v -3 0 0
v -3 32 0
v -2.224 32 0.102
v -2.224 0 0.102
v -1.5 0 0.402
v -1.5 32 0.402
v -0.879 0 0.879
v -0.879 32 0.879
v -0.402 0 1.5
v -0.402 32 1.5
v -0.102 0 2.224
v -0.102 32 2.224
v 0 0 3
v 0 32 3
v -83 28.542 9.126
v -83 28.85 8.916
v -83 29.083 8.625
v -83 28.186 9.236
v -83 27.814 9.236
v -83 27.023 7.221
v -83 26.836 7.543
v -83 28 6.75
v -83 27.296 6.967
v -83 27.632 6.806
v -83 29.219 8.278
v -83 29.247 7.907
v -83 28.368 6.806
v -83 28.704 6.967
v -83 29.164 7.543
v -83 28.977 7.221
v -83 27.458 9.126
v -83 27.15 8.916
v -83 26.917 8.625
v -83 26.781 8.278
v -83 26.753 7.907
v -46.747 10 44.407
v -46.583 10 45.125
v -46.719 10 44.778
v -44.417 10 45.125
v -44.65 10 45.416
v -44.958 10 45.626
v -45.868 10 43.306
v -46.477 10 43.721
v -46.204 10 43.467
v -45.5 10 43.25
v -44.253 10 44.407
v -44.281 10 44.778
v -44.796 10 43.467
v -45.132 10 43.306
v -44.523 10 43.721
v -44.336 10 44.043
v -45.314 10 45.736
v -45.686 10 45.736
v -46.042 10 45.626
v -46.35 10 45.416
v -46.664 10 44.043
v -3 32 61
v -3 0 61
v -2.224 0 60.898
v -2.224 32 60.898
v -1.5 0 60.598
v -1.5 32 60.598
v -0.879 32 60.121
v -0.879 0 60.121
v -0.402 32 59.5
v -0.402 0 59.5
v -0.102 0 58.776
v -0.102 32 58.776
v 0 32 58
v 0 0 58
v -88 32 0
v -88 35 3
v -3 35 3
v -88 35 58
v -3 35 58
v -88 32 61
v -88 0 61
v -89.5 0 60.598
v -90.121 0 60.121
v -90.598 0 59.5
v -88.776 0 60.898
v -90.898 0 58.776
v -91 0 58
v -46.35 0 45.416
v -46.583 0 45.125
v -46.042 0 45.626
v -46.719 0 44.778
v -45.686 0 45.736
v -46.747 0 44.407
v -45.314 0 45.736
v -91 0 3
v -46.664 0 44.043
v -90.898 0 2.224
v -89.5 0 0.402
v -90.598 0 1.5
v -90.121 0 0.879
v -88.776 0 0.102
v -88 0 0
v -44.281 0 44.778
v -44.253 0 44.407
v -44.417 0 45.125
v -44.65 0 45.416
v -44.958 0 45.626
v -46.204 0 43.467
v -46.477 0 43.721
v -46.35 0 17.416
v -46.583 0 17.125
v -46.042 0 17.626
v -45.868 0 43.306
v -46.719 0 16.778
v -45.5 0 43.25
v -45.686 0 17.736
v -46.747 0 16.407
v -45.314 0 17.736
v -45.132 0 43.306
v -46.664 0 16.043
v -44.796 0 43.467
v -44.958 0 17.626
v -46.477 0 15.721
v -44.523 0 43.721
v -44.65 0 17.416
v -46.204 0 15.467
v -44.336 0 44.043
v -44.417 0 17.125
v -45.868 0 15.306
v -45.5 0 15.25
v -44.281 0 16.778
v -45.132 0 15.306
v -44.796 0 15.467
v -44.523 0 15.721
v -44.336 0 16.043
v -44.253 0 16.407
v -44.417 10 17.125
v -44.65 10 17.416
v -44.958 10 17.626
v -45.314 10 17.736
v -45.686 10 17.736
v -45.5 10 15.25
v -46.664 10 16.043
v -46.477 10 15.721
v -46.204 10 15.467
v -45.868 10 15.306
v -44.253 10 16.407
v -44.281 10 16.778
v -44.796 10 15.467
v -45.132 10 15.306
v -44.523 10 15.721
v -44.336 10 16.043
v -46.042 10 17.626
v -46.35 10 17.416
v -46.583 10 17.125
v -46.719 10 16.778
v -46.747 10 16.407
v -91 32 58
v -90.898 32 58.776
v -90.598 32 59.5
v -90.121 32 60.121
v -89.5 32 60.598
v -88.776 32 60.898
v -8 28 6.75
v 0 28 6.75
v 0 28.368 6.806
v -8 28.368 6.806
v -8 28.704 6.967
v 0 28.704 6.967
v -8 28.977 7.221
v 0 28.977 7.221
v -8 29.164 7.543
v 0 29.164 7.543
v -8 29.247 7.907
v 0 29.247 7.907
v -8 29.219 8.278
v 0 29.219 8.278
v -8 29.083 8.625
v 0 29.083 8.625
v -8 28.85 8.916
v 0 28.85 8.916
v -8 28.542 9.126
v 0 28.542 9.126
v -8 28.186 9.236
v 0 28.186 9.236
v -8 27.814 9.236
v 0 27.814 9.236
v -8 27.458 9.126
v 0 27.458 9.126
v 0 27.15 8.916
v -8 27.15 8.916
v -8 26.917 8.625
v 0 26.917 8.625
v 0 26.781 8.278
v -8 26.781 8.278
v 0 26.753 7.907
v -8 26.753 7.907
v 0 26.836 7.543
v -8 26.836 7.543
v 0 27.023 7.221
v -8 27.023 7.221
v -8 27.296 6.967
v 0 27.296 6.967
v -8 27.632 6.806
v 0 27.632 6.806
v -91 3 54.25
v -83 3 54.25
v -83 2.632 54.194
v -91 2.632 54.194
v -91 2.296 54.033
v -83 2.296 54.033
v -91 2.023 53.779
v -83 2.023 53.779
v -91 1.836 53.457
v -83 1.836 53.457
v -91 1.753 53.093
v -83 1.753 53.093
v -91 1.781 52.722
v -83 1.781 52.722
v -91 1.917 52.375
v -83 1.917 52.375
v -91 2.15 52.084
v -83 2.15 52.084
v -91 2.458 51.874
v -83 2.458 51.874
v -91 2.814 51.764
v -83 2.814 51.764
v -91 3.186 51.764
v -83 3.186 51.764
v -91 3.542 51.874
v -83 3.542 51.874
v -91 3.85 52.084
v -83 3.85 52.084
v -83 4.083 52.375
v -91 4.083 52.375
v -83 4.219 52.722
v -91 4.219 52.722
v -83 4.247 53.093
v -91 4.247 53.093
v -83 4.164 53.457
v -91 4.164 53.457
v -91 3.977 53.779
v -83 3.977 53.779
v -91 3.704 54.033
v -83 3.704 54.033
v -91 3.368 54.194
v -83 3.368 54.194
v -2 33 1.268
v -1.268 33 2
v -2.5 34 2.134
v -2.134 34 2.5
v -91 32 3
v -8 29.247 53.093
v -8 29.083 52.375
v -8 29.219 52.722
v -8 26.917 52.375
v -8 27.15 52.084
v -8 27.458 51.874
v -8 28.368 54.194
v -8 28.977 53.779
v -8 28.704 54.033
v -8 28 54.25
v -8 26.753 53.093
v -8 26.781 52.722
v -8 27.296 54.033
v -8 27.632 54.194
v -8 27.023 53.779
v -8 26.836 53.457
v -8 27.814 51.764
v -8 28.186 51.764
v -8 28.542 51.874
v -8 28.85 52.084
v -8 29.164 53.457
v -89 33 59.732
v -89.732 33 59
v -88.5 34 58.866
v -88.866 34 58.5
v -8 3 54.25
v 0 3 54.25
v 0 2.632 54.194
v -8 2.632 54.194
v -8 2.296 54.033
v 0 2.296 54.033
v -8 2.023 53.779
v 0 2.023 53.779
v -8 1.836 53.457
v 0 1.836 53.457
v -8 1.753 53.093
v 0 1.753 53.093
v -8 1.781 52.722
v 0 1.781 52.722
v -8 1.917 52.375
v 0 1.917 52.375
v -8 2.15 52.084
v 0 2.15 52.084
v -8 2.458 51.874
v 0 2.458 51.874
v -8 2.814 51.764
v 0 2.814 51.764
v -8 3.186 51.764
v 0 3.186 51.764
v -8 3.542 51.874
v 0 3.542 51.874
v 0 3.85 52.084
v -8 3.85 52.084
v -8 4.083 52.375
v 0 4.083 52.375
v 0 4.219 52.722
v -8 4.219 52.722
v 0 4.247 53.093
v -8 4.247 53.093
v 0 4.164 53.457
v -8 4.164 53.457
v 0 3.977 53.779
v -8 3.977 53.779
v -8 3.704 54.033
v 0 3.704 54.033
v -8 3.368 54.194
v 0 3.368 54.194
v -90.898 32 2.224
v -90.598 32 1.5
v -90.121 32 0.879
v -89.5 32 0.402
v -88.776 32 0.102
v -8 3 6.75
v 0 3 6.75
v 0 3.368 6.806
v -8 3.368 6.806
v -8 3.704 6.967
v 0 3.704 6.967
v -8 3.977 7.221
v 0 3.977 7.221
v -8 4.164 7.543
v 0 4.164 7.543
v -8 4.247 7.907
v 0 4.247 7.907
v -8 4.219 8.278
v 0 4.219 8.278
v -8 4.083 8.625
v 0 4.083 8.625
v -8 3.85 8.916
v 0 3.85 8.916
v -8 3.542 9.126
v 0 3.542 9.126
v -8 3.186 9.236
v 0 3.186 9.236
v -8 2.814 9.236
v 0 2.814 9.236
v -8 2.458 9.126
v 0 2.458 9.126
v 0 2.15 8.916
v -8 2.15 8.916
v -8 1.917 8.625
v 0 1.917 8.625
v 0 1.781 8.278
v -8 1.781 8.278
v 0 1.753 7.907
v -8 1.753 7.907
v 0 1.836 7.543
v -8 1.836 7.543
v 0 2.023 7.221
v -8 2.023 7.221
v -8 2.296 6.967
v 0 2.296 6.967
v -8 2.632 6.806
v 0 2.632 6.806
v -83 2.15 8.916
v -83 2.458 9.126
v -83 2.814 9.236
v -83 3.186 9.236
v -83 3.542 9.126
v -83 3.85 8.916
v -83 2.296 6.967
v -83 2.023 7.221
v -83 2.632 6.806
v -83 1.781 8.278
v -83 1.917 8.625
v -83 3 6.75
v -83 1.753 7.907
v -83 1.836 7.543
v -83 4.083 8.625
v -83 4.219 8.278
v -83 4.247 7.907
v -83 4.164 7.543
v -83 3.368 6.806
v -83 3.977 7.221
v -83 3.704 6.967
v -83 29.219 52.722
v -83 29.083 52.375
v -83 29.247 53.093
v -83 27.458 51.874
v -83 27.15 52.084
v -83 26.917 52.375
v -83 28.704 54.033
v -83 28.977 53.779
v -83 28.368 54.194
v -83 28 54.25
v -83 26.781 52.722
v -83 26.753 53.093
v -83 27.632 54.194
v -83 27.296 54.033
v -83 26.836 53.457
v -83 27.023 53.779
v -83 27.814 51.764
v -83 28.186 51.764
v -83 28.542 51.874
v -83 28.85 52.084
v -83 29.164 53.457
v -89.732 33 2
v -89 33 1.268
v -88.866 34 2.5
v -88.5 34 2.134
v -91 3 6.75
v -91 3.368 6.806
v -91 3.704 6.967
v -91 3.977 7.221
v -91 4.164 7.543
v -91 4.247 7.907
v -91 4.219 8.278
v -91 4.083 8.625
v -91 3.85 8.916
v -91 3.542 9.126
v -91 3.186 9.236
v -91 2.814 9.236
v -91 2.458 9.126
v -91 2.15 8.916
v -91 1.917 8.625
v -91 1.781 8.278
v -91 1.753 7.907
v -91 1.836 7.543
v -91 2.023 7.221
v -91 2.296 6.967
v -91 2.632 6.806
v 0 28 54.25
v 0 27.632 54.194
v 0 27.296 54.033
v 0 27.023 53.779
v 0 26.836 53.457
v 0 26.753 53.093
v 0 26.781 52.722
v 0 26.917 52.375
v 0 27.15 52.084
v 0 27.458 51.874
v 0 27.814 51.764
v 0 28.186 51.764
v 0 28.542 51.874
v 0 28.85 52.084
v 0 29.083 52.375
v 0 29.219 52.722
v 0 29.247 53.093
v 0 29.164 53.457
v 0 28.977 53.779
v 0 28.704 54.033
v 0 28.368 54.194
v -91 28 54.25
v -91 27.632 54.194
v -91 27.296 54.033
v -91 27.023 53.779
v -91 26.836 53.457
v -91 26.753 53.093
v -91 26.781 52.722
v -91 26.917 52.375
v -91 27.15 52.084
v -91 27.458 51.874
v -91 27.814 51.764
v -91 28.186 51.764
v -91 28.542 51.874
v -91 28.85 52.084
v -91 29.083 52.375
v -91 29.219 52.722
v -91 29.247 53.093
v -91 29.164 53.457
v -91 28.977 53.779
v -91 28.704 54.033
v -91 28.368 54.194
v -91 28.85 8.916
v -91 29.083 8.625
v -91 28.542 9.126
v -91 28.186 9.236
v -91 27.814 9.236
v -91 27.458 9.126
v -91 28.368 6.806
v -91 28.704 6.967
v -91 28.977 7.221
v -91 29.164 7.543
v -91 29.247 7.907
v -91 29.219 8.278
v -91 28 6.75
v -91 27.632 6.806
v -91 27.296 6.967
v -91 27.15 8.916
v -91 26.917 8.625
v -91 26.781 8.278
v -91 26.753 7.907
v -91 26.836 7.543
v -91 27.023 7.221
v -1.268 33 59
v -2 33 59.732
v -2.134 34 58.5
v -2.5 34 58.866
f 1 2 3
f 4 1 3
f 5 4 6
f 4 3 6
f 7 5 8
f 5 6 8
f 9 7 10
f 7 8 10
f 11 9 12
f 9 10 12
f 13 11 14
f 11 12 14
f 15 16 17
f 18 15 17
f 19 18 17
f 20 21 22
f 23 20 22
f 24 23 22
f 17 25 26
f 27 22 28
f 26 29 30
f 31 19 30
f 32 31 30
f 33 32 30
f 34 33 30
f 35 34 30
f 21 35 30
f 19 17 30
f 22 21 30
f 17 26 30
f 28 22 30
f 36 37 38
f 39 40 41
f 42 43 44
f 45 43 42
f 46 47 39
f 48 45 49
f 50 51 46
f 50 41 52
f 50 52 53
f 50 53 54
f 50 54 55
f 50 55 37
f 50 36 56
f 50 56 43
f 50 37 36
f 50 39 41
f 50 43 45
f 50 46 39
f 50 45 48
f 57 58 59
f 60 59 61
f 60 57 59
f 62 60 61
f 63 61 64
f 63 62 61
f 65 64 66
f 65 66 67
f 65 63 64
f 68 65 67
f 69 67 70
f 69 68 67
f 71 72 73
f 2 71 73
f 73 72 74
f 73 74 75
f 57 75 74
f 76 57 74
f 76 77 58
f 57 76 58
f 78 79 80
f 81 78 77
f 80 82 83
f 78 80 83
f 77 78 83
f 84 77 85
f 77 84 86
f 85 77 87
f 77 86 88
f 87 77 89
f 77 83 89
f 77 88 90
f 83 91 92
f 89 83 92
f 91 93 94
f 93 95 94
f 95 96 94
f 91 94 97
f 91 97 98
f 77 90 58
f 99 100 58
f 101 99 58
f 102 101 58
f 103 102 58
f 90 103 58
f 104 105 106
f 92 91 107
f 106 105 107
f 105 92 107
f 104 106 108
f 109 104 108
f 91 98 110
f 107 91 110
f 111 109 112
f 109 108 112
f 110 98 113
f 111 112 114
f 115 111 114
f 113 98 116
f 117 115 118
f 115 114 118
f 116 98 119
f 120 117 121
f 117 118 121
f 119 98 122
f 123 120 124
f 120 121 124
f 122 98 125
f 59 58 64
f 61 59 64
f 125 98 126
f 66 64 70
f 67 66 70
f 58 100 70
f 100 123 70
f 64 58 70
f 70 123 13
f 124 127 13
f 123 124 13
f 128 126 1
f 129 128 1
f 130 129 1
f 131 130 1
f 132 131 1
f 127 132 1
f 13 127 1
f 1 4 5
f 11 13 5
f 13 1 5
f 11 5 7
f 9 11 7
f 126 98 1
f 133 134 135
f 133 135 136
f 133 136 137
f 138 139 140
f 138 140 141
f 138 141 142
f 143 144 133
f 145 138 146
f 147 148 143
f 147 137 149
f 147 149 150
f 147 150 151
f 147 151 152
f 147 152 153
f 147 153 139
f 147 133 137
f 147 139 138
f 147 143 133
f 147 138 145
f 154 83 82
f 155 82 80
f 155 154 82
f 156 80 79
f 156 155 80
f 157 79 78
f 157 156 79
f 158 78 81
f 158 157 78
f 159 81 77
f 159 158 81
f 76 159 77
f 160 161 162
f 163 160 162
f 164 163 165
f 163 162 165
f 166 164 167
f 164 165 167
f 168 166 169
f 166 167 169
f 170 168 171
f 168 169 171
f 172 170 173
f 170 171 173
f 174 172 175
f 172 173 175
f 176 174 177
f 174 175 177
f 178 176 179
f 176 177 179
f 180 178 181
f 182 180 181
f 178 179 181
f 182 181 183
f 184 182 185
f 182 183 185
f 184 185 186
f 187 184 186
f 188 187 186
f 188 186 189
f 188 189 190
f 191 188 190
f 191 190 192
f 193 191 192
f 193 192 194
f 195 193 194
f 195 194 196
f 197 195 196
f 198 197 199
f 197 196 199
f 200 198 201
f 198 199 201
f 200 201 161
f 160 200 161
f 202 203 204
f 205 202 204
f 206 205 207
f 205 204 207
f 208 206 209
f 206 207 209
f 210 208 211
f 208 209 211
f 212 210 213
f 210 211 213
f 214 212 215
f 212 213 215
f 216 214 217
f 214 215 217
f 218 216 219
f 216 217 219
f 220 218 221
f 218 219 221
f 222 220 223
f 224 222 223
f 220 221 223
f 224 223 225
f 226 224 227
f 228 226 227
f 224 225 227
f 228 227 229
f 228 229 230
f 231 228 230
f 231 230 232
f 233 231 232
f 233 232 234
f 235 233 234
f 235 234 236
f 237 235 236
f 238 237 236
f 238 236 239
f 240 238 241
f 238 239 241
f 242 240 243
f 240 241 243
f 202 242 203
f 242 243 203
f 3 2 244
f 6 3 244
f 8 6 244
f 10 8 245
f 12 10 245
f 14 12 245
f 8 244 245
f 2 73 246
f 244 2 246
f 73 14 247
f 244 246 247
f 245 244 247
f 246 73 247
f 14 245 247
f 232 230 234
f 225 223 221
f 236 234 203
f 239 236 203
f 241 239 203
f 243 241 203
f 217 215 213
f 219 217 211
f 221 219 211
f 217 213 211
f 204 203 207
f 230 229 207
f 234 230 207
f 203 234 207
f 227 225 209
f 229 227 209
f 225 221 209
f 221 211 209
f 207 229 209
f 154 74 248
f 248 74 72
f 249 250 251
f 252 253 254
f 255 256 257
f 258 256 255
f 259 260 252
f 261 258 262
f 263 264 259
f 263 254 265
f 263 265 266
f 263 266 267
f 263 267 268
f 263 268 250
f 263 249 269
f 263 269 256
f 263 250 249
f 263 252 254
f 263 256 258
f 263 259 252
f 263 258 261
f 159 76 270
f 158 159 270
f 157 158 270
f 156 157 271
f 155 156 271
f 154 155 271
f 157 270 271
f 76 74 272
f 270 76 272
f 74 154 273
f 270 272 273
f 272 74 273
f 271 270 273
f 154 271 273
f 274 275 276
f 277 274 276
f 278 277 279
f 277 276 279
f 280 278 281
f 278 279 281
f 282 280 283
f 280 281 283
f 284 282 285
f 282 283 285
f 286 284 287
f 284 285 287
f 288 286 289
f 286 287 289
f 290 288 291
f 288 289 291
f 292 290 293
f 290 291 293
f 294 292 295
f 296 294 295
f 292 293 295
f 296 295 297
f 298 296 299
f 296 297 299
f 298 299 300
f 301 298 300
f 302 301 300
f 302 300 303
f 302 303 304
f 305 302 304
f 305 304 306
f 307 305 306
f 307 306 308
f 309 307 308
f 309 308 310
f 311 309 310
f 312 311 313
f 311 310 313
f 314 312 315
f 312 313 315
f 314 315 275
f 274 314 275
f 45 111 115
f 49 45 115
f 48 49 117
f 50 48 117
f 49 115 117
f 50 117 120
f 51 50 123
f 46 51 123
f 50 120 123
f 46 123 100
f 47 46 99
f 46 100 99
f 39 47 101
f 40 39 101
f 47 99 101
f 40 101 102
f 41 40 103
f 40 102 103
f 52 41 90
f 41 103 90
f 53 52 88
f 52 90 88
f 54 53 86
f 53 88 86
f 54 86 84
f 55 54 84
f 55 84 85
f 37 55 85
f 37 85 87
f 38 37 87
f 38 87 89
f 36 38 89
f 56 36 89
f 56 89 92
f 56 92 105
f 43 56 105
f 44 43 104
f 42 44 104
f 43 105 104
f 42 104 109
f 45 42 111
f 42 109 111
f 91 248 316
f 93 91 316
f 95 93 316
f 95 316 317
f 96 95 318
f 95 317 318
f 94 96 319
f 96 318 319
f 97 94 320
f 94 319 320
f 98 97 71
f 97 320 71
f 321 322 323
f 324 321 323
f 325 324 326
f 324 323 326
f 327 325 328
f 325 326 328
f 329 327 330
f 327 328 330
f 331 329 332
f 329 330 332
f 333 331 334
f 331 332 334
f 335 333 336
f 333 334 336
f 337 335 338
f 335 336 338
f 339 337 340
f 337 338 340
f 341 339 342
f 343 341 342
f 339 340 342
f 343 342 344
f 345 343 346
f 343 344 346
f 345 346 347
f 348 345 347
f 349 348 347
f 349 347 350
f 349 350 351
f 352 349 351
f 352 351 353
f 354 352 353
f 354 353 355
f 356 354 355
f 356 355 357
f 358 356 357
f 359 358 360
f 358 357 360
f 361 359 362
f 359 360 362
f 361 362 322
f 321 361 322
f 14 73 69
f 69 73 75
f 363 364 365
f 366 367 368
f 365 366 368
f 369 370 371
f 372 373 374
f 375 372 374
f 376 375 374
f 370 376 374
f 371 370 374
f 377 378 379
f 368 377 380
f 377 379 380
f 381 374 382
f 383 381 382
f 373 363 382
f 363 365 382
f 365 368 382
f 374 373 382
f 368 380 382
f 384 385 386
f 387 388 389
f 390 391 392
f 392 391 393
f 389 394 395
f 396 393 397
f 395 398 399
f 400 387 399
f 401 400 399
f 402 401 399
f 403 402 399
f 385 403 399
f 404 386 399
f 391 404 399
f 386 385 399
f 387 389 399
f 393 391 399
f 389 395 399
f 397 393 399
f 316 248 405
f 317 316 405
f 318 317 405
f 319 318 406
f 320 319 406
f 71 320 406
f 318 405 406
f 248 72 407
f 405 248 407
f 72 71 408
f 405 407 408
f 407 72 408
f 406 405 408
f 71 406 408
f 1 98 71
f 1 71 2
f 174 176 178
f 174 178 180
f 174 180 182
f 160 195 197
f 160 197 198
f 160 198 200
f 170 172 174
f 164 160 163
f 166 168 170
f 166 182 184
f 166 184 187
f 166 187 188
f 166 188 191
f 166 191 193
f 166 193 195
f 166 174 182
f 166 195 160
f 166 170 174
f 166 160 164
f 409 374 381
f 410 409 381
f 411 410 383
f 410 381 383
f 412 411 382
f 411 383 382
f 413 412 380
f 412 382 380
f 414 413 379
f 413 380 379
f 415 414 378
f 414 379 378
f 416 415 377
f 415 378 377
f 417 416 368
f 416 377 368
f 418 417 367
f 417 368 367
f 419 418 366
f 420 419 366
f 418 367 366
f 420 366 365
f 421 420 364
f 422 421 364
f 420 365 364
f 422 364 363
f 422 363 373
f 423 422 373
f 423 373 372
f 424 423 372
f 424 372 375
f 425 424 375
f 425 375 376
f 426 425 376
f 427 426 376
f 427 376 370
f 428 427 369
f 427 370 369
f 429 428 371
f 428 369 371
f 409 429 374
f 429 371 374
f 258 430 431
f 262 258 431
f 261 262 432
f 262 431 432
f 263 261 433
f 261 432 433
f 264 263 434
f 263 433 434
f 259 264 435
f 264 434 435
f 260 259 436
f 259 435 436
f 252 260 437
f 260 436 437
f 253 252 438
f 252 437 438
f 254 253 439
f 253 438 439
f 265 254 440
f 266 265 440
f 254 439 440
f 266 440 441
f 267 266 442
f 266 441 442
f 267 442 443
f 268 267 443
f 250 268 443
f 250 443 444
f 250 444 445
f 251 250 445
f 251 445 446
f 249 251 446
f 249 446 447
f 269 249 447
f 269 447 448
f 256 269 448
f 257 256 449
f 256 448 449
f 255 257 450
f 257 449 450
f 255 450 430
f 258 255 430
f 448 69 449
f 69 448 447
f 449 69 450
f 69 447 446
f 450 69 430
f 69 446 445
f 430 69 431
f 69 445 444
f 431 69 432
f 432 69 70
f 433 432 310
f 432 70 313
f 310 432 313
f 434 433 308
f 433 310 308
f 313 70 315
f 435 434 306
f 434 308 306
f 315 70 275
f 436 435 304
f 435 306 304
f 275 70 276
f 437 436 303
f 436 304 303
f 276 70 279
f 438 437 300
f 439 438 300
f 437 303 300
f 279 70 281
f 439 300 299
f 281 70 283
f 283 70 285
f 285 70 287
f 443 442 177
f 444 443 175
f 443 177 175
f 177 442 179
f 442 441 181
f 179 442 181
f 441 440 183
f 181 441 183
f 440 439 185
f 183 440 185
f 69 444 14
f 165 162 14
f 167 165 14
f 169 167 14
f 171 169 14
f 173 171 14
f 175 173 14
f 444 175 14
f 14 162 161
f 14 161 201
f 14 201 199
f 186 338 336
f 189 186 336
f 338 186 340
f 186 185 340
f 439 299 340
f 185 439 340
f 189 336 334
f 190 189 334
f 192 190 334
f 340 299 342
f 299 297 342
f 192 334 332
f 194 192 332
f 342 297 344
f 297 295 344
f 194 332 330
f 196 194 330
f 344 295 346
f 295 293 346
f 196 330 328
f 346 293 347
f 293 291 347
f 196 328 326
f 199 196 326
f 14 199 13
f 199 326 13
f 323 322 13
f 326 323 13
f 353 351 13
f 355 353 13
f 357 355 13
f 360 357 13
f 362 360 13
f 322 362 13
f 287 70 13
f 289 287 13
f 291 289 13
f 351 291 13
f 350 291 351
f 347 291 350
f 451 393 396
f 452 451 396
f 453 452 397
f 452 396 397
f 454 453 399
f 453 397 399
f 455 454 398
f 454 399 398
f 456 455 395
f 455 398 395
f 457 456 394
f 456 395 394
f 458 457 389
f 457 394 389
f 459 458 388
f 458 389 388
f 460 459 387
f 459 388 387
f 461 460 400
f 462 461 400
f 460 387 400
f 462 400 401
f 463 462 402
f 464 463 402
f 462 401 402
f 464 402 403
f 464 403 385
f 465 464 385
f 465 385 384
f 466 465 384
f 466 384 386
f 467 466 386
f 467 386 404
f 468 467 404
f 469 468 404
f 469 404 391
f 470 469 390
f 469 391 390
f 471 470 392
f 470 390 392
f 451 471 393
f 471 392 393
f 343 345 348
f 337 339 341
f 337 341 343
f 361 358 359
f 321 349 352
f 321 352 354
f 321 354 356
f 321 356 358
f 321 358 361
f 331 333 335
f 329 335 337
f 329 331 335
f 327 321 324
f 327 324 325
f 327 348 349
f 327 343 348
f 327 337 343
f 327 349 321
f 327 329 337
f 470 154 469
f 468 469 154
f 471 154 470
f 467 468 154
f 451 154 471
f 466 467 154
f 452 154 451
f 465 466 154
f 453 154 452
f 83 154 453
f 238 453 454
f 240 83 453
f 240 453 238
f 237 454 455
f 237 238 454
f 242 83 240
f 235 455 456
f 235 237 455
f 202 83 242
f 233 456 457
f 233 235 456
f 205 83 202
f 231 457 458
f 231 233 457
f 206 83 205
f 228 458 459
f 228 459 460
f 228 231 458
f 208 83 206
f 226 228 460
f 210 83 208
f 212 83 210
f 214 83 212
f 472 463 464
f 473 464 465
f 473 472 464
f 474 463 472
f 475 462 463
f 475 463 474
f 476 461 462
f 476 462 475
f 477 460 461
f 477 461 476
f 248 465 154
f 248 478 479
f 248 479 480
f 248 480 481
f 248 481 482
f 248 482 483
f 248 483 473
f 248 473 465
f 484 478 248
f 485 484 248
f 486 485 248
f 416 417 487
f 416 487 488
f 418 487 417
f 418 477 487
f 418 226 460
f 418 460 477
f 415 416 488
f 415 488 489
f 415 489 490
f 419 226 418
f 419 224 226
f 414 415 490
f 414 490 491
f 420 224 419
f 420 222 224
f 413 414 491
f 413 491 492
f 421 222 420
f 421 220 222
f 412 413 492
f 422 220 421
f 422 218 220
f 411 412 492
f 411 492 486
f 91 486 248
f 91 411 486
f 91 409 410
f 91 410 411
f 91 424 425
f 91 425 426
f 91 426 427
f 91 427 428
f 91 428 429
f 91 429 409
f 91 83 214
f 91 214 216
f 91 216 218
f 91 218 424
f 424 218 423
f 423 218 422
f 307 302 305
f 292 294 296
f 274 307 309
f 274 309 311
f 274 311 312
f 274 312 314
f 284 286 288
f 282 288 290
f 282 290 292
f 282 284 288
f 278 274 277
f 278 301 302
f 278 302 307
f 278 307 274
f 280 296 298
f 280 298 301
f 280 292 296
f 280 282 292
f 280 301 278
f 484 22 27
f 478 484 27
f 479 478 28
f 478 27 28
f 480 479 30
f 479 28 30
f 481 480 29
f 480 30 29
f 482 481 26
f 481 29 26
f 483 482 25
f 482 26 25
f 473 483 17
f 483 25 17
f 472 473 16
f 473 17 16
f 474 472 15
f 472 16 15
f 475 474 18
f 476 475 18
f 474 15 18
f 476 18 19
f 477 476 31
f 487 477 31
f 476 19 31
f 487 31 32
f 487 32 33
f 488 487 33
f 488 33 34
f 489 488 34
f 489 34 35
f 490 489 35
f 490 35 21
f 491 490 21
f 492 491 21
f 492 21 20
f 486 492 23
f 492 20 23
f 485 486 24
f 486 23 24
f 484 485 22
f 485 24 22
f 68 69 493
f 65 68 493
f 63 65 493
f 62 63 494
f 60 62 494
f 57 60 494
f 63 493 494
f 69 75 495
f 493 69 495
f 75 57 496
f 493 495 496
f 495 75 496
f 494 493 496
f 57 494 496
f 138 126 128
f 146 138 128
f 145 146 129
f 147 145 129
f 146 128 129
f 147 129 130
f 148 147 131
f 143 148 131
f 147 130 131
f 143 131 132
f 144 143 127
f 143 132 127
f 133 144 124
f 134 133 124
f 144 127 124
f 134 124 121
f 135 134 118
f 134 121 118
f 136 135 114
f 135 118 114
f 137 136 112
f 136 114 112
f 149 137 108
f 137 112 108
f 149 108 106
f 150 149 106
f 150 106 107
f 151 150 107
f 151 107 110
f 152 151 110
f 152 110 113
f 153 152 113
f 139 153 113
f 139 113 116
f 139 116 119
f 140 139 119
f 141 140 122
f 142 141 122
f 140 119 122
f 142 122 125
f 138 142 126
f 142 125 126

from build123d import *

# Parameters (mm, degrees)
SKETCH1_W           = 91
SKETCH1_H           = 61
BOSS_EXTRUDE1_DEPTH = 35
SKETCH2_R           = 1.25
CUT_EXTRUDE1_DEPTH  = 8
CUT_EXTRUDE2_START  = -83
SKETCH2_2_R         = 1.25
CUT_EXTRUDE2_DEPTH  = 8
FILLET2_R           = 3
CHAMFER1_SIZE       = 3
SKETCH3_R           = 1.25
CUT_EXTRUDE3_DEPTH  = 10


with BuildPart() as part:
    # Sketch1 → Boss-Extrude1 (new body)
    with BuildSketch(Plane(origin=(0, 0, 0), x_dir=(1, 0, 0), z_dir=(0, 1, 0))):
        with Locations((-45.5, -30.5)):
            Rectangle(SKETCH1_W, SKETCH1_H)
    extrude(amount=BOSS_EXTRUDE1_DEPTH)

    # Sketch2 → Cut-Extrude1 (cut)
    with BuildSketch(Plane(origin=(0, 0, 0), x_dir=(0, 0, -1), z_dir=(1, 0, 0))):
        with Locations((-8, 28)):
            Circle(SKETCH2_R)
        with Locations((-8, 3)):
            Circle(SKETCH2_R)
        with Locations(Location((-53, 3, 0), (0, 0, 180))):
            Circle(SKETCH2_R)
        with Locations(Location((-53, 28, 0), (0, 0, 180))):
            Circle(SKETCH2_R)
    extrude(amount=-CUT_EXTRUDE1_DEPTH, mode=Mode.SUBTRACT)

    # Sketch2<2> → Cut-Extrude2 (cut)
    with BuildSketch(Plane(origin=(0, 0, 0), x_dir=(0, 0, -1), z_dir=(1, 0, 0)).offset(CUT_EXTRUDE2_START)):
        with Locations((-8, 28)):
            Circle(SKETCH2_2_R)
        with Locations((-8, 3)):
            Circle(SKETCH2_2_R)
        with Locations(Location((-53, 3, 0), (0, 0, 180))):
            Circle(SKETCH2_2_R)
        with Locations(Location((-53, 28, 0), (0, 0, 180))):
            Circle(SKETCH2_2_R)
    extrude(amount=-CUT_EXTRUDE2_DEPTH, mode=Mode.SUBTRACT)

    # Fillet2
    fillet2_edges = [part.edges().sort_by_distance(p)[0] for p in [
        (0, 17.5, 61),
        (-91, 17.5, 61),
        (-91, 17.5, 0),
        (0, 17.5, 0),
    ]]
    fillet(fillet2_edges, radius=FILLET2_R)

    # Chamfer1
    chamfer1_edges = [part.edges().sort_by_distance(p)[0] for p in [
        (-91, 35, 30.5),
        (-45.5, 35, 0),
        (0, 35, 30.5),
        (-45.5, 35, 61),
        (-90.121320344, 35, 60.121320344),
        (-0.878679656, 35, 60.121320344),
        (-0.878679656, 35, 0.878679656),
        (-90.121320344, 35, 0.878679656),
    ]]
    chamfer(chamfer1_edges, length=CHAMFER1_SIZE)

    # Sketch3 → Cut-Extrude3 (cut)
    with BuildSketch(Plane.XZ):
        with Locations(Location((-45.5, 44.5, 0), (0, 0, 270))):
            Circle(SKETCH3_R)
        with Locations(Location((-45.5, 16.5, 0), (0, 0, 270))):
            Circle(SKETCH3_R)
    extrude(amount=-CUT_EXTRUDE3_DEPTH, mode=Mode.SUBTRACT)


solid = part.part
